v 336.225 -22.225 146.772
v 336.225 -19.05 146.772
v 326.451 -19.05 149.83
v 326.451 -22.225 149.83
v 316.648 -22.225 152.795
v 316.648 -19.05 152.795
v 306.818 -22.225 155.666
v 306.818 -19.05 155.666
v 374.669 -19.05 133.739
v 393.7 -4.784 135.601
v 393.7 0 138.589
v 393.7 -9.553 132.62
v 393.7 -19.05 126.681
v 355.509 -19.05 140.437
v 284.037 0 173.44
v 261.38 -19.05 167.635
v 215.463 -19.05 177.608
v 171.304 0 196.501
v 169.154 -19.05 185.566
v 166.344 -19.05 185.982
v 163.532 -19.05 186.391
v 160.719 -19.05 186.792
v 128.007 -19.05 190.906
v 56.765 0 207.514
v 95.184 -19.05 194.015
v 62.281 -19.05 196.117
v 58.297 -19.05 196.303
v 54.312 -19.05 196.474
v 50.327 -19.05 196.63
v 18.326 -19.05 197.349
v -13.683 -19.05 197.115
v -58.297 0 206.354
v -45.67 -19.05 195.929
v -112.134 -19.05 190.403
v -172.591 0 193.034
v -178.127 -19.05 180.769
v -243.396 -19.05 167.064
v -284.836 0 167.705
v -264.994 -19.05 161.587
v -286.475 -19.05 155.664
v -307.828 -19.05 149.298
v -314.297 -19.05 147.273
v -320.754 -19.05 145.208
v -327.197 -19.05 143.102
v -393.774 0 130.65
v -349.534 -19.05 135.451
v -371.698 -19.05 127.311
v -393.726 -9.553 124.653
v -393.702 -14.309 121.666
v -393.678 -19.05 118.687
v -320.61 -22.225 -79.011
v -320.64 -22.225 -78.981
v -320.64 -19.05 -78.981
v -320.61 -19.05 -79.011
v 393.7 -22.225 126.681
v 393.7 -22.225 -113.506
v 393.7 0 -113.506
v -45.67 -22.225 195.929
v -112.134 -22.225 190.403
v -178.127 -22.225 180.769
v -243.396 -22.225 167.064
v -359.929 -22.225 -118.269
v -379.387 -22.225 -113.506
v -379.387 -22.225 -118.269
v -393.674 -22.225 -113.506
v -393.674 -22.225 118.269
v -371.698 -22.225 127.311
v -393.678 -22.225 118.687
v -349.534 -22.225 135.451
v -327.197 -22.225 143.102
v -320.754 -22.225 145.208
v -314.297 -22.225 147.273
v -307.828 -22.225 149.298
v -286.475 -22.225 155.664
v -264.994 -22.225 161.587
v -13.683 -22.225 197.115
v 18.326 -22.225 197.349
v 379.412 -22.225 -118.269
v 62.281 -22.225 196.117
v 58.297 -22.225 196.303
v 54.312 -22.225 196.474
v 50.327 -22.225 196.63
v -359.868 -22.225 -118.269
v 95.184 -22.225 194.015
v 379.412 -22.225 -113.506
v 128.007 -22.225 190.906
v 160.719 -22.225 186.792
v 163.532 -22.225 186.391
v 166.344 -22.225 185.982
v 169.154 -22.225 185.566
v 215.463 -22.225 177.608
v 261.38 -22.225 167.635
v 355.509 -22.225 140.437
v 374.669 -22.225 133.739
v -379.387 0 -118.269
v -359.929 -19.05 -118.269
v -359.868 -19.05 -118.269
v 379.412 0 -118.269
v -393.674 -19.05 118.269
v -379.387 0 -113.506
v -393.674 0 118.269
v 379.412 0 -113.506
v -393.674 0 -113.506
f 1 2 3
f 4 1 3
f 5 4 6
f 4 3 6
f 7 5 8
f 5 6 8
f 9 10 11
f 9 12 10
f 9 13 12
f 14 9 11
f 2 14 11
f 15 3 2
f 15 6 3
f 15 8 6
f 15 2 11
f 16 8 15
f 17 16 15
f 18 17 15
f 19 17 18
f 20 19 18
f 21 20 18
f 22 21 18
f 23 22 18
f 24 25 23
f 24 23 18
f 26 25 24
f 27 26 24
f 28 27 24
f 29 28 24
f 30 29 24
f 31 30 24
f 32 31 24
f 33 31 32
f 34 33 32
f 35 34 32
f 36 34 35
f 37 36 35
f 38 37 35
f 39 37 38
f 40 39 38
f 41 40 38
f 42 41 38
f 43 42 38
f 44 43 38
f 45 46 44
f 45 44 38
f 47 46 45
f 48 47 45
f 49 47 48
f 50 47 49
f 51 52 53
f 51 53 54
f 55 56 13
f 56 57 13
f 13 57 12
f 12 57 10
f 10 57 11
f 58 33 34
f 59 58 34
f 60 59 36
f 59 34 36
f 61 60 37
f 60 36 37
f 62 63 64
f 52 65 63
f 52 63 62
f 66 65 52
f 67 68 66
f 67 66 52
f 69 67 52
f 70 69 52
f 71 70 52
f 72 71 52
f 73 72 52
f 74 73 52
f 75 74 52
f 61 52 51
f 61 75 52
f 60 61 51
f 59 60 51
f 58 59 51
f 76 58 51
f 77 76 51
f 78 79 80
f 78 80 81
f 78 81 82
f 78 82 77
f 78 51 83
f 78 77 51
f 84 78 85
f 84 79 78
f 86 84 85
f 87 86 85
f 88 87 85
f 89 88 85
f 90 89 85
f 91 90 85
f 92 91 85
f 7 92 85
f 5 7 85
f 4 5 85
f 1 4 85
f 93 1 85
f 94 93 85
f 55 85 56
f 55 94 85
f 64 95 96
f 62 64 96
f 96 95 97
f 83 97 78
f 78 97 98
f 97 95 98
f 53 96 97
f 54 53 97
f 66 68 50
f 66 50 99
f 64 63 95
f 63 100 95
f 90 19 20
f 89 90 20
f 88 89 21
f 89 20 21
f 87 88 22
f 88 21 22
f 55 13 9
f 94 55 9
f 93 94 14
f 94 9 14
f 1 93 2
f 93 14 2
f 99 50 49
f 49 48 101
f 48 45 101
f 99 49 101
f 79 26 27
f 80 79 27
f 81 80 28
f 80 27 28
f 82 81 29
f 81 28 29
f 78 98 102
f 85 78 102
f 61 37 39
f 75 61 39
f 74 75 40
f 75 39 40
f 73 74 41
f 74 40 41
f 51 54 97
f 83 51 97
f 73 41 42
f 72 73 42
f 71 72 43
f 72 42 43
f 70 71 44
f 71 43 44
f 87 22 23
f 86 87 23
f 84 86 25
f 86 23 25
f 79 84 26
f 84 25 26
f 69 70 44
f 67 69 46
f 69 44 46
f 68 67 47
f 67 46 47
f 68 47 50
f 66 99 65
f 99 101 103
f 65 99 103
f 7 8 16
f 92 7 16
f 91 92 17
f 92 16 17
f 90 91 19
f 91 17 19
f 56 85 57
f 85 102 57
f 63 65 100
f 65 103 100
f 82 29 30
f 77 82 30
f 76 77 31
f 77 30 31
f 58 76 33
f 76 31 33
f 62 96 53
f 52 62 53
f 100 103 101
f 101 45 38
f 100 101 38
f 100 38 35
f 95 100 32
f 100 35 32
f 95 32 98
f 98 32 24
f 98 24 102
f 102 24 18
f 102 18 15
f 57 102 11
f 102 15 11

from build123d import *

# Parameters (mm, degrees)
F1_DEPTH    = 19.05
F2_T2_ANGLE = 47.80727079
F4_DEPTH    = 3.175


# Not quite as in the source:
# - a fillet or chamfer that OpenCascade refuses, or shapes differently, is made with other operations: its cross-section is extruded or revolved along the edge and cut away or added


with BuildPart() as f1:
    # F0 (on Front) → F1 (new body)
    with BuildSketch(Plane.XZ):
        with BuildLine():
            Line((-379.386894745, -118.26875), (379.4125, -118.26875))
            Line((379.4125, -118.26875), (379.4125, -113.50625))
            Line((379.4125, -113.50625), (393.7, -113.50625))
            Line((393.7, -113.50625), (393.7, 124.61875))
            ThreePointArc((393.7, 124.61875), (-0.5889314831, 196.0563533265), (-393.674394745, 118.26875))
            Line((-393.674394745, 118.26875), (-393.674394745, -113.50625))
            Line((-393.674394745, -113.50625), (-379.386894745, -113.50625))
            Line((-379.386894745, -113.50625), (-379.386894745, -118.26875))
        make_face()
        with BuildLine():
            ThreePointArc((-393.674394745, 118.26875), (-0.5889314831, 196.0563533265), (393.7, 124.61875))
            Line((393.7, 124.61875), (393.7, 138.90625))
            ThreePointArc((393.7, 138.90625), (-0.7824585401, 208.7544433839), (-393.7768174305, 130.96875))
            Line((-393.7768174305, 130.96875), (-393.674394745, 118.26875))
        make_face()
    extrude(amount=F1_DEPTH)

    # F2: chamfer of 19.558 x 11.43 on 1 edges, made by hand

    # F2_s1 → F2_t2 (revolve, cut)
    with BuildSketch(Plane(origin=(327.911656241, 0, -141.3984070605), x_dir=(0, 1, 0), z_dir=(0.9182658757, 0, -0.3959643691))):
        Polygon((0.508, 284.621375818), (-19.05, 273.191375818), (-19.05, 284.621375818), align=None)
    revolve(axis=Axis((10.1741912427, -19.05, -878.2512511865), (0, -1, 0)), revolution_arc=F2_T2_ANGLE, mode=Mode.SUBTRACT)

    # F3 (on face) → F4 (join)
    with BuildSketch(Plane.XZ.offset(19.05)):
        Polygon((71.1841804533, -118.26875), (178.9472539061, -118.26875), (218.205169263, -79.0108346431), (164.3236325366, -25.1292979167), (110.4420958102, -79.0108346431), align=None)
        Polygon((218.205169263, -79.0108346431), (178.9472539061, -118.26875), (257.4630846199, -118.26875), align=None)
        Polygon((393.7, -113.50625), (393.7, -38.9795184745), (379.8497794422, -25.1292979167), (325.9682427158, -79.0108346431), (286.710327359, -118.26875), (379.4125, -118.26875), (379.4125, -113.50625), align=None)
        Polygon((379.8497794422, -25.1292979167), (393.7, -38.9795184745), (393.7, -11.279077359), align=None)
        Polygon((218.205169263, -79.0108346431), (257.4630846199, -118.26875), (286.710327359, -118.26875), (325.9682427158, -79.0108346431), (272.0867059894, -25.1292979167), (218.205169263, 28.7522388097), (164.3236325366, -25.1292979167), align=None)
        Polygon((41.9369377142, -118.26875), (71.1841804533, -118.26875), (110.4420958102, -79.0108346431), (56.5605590837, -25.1292979167), (2.6790223573, 28.7522388097), (-51.2025143691, -25.1292979167), (2.6790223573, -79.0108346431), align=None)
        Polygon((-36.5788929995, -118.26875), (41.9369377142, -118.26875), (2.6790223573, -79.0108346431), align=None)
        Polygon((-144.3419664524, -118.26875), (-36.5788929995, -118.26875), (2.6790223573, -79.0108346431), (-51.2025143691, -25.1292979167), (-105.0840510955, -79.0108346431), align=None)
        Polygon((325.9682427158, -79.0108346431), (379.8497794422, -25.1292979167), (393.7, -11.279077359), (393.7, 68.7835549784), (379.8497794422, 82.6337755361), (325.9682427158, 28.7522388097), (272.0867059894, -25.1292979167), align=None)
        Polygon((110.4420958102, -79.0108346431), (164.3236325366, -25.1292979167), (218.205169263, 28.7522388097), (164.3236325366, 82.6337755361), (110.4420958102, 28.7522388097), (56.5605590837, -25.1292979167), align=None)
        Polygon((-173.5892091915, -118.26875), (-144.3419664524, -118.26875), (-105.0840510955, -79.0108346431), (-158.9655878219, -25.1292979167), (-212.8471245483, 28.7522388097), (-266.7286612747, -25.1292979167), (-212.8471245483, -79.0108346431), align=None)
        Polygon((379.8497794422, 82.6337755361), (393.7, 68.7835549784), (393.7, 96.4839960939), align=None)
        Polygon((218.205169263, 28.7522388097), (272.0867059894, -25.1292979167), (325.9682427158, 28.7522388097), (272.0867059894, 82.6337755361), (218.205169263, 136.5153122625), (164.3236325366, 82.6337755361), align=None)
        Polygon((2.6790223573, 28.7522388097), (56.5605590837, -25.1292979167), (110.4420958102, 28.7522388097), (56.5605590837, 82.6337755361), (2.6790223573, 136.5153122625), (-51.2025143691, 82.6337755361), align=None)
        Polygon((-105.0840510955, -79.0108346431), (-51.2025143691, -25.1292979167), (2.6790223573, 28.7522388097), (-51.2025143691, 82.6337755361), (-105.0840510955, 28.7522388097), (-158.9655878219, -25.1292979167), align=None)
        Polygon((-252.1050399052, -118.26875), (-173.5892091915, -118.26875), (-212.8471245483, -79.0108346431), align=None)
        Polygon((-359.868113358, -118.26875), (-252.1050399052, -118.26875), (-212.8471245483, -79.0108346431), (-266.7286612747, -25.1292979167), (-320.6101980012, -79.0108346431), align=None)
        with BuildLine():
            Line((325.9682427158, 28.7522388097), (379.8497794422, 82.6337755361))
            Line((379.8497794422, 82.6337755361), (393.7, 96.4839960939))
            Line((393.7, 96.4839960939), (393.7, 126.6814901711))
            ThreePointArc((393.7, 126.6814901711), (365.104665334, 137.1335129285), (336.2249713921, 146.7720409389))
            Line((336.2249713921, 146.7720409388), (325.9682427158, 136.5153122625))
            Line((325.9682427158, 136.5153122625), (272.0867059894, 82.6337755361))
            Line((272.0867059894, 82.6337755361), (325.9682427158, 28.7522388097))
        make_face()
        with BuildLine():
            Line((110.4420958102, 28.7522388097), (164.3236325366, 82.6337755361))
            Line((164.3236325366, 82.6337755361), (218.205169263, 136.5153122625))
            Line((218.205169263, 136.5153122625), (169.1544903585, 185.565991167))
            ThreePointArc((169.1544903585, 185.565991167), (164.9380697375, 186.1875692954), (160.7192193307, 186.792435783))
            Line((160.7192193307, 186.792435783), (110.4420958102, 136.5153122625))
            Line((110.4420958102, 136.5153122625), (56.5605590837, 82.6337755361))
            Line((56.5605590837, 82.6337755361), (110.4420958102, 28.7522388097))
        make_face()
        Polygon((-212.8471245483, 28.7522388097), (-158.9655878219, -25.1292979167), (-105.0840510955, 28.7522388097), (-158.9655878219, 82.6337755361), (-212.8471245483, 136.5153122625), (-266.7286612747, 82.6337755361), align=None)
        with BuildLine():
            Line((218.205169263, 136.5153122625), (272.0867059894, 82.6337755361))
            Line((272.0867059894, 82.6337755361), (325.9682427158, 136.5153122625))
            Line((325.9682427158, 136.5153122625), (306.8177631195, 155.6657918589))
            ThreePointArc((306.8177631195, 155.6657918589), (238.4761479453, 172.8719942997), (169.1544903585, 185.565991167))
            Line((169.1544903585, 185.565991167), (218.205169263, 136.5153122625))
        make_face()
        with BuildLine():
            Line((2.6790223573, 136.5153122625), (56.5605590838, 82.6337755361))
            Line((56.5605590837, 82.6337755361), (110.4420958102, 136.5153122625))
            Line((110.4420958102, 136.5153122625), (56.5605590837, 190.3968489889))
            Line((56.5605590837, 190.3968489889), (50.3274681554, 196.6299399173))
            ThreePointArc((50.3274681554, 196.6299399173), (2.3207372282, 197.350991232), (-45.670346508, 195.92901685))
            Line((-45.670346508, 195.92901685), (-51.2025143691, 190.3968489889))
            Line((-51.2025143691, 190.3968489889), (2.6790223573, 136.5153122625))
        make_face()
        Polygon((-105.0840510955, 28.7522388097), (-51.2025143691, 82.6337755361), (2.6790223573, 136.5153122625), (-51.2025143691, 190.3968489889), (-105.0840510955, 136.5153122625), (-158.9655878219, 82.6337755361), align=None)
        Polygon((-266.7286612747, -25.1292979167), (-212.8471245483, 28.7522388097), (-266.7286612747, 82.6337755361), (-320.6101980012, 28.7522388097), (-374.4917347276, -25.1292979167), (-320.6404889111, -78.9805437332), (-320.6101980012, -79.0108346431), align=None)
        Polygon((-379.386894745, -118.26875), (-359.9286951779, -118.26875), (-320.6404889111, -78.9805437332), (-374.4917347276, -25.1292979167), (-393.674394745, -5.9466378993), (-393.674394745, -113.50625), (-379.386894745, -113.50625), align=None)
        with BuildLine():
            Line((325.9682427158, 136.5153122625), (336.2249713921, 146.7720409388))
            ThreePointArc((336.2249713921, 146.7720409389), (321.5531223101, 151.3239145605), (306.8177631195, 155.6657918589))
            Line((306.8177631195, 155.6657918589), (325.9682427158, 136.5153122625))
        make_face()
        with BuildLine():
            Line((56.5605590837, 190.3968489889), (110.4420958102, 136.5153122625))
            Line((110.4420958102, 136.5153122625), (160.7192193307, 186.792435783))
            ThreePointArc((160.7192193307, 186.792435783), (111.6070850178, 192.5863782868), (62.2805468294, 196.1168367345))
            Line((62.2805468293, 196.1168367345), (56.5605590837, 190.3968489889))
        make_face()
        with BuildLine():
            Line((-320.6101980012, 28.7522388097), (-266.7286612747, 82.6337755361))
            Line((-266.7286612747, 82.6337755361), (-212.8471245483, 136.5153122625))
            Line((-212.8471245483, 136.5153122625), (-243.3958660177, 167.0640537319))
            ThreePointArc((-243.3958660177, 167.0640537319), (-275.7499582928, 158.6813605815), (-307.8279930641, 149.2975171996))
            Line((-307.8279930641, 149.2975171996), (-320.6101980012, 136.5153122625))
            Line((-320.6101980012, 136.5153122625), (-374.4917347276, 82.6337755361))
            Line((-374.4917347276, 82.6337755361), (-320.6101980012, 28.7522388097))
        make_face()
        with BuildLine():
            Line((-212.8471245483, 136.5153122625), (-158.9655878219, 82.6337755361))
            Line((-158.9655878219, 82.6337755361), (-105.0840510955, 136.5153122625))
            Line((-105.0840510955, 136.5153122625), (-153.4329816595, 184.8642428265))
            ThreePointArc((-153.4329816595, 184.8642428265), (-198.6042128715, 176.9233498209), (-243.3958660177, 167.0640537319))
            Line((-243.3958660177, 167.0640537319), (-212.8471245483, 136.5153122625))
        make_face()
        with BuildLine():
            Line((50.3274681554, 196.6299399173), (56.5605590837, 190.3968489889))
            Line((56.5605590837, 190.3968489889), (62.2805468293, 196.1168367345))
            ThreePointArc((62.2805468294, 196.1168367345), (56.3047208944, 196.3900074992), (50.3274681554, 196.6299399173))
        make_face()
        with BuildLine():
            Line((-105.0840510955, 136.5153122625), (-51.2025143691, 190.3968489889))
            Line((-51.2025143691, 190.3968489889), (-45.670346508, 195.92901685))
            ThreePointArc((-45.670346508, 195.92901685), (-99.6910472687, 191.75411796), (-153.4329816595, 184.8642428265))
            Line((-153.4329816595, 184.8642428265), (-105.0840510955, 136.5153122625))
        make_face()
        Polygon((-374.4917347276, -25.1292979167), (-320.6101980012, 28.7522388097), (-374.4917347276, 82.6337755361), (-393.674394745, 101.8164355535), (-393.674394745, -5.9466378993), align=None)
        with BuildLine():
            Line((-393.674394745, 101.8164355535), (-374.4917347276, 82.6337755361))
            Line((-374.4917347276, 82.6337755361), (-320.6101980012, 136.5153122625))
            Line((-320.6101980012, 136.5153122625), (-327.1969421676, 143.102056429))
            ThreePointArc((-327.1969421676, 143.102056429), (-360.6383542509, 131.4417302391), (-393.6777661416, 118.6867895926))
            Line((-393.6777661416, 118.6867895926), (-393.674394745, 118.26875))
            Line((-393.674394745, 118.26875), (-393.674394745, 101.8164355535))
        make_face()
        with BuildLine():
            Line((-320.6101980012, 136.5153122625), (-307.8279930641, 149.2975171996))
            ThreePointArc((-307.8279930641, 149.2975171996), (-317.5271092238, 146.2455610624), (-327.1969421676, 143.102056429))
            Line((-327.1969421676, 143.102056429), (-320.6101980012, 136.5153122625))
        make_face()
    extrude(amount=F4_DEPTH)


solid = f1.part
